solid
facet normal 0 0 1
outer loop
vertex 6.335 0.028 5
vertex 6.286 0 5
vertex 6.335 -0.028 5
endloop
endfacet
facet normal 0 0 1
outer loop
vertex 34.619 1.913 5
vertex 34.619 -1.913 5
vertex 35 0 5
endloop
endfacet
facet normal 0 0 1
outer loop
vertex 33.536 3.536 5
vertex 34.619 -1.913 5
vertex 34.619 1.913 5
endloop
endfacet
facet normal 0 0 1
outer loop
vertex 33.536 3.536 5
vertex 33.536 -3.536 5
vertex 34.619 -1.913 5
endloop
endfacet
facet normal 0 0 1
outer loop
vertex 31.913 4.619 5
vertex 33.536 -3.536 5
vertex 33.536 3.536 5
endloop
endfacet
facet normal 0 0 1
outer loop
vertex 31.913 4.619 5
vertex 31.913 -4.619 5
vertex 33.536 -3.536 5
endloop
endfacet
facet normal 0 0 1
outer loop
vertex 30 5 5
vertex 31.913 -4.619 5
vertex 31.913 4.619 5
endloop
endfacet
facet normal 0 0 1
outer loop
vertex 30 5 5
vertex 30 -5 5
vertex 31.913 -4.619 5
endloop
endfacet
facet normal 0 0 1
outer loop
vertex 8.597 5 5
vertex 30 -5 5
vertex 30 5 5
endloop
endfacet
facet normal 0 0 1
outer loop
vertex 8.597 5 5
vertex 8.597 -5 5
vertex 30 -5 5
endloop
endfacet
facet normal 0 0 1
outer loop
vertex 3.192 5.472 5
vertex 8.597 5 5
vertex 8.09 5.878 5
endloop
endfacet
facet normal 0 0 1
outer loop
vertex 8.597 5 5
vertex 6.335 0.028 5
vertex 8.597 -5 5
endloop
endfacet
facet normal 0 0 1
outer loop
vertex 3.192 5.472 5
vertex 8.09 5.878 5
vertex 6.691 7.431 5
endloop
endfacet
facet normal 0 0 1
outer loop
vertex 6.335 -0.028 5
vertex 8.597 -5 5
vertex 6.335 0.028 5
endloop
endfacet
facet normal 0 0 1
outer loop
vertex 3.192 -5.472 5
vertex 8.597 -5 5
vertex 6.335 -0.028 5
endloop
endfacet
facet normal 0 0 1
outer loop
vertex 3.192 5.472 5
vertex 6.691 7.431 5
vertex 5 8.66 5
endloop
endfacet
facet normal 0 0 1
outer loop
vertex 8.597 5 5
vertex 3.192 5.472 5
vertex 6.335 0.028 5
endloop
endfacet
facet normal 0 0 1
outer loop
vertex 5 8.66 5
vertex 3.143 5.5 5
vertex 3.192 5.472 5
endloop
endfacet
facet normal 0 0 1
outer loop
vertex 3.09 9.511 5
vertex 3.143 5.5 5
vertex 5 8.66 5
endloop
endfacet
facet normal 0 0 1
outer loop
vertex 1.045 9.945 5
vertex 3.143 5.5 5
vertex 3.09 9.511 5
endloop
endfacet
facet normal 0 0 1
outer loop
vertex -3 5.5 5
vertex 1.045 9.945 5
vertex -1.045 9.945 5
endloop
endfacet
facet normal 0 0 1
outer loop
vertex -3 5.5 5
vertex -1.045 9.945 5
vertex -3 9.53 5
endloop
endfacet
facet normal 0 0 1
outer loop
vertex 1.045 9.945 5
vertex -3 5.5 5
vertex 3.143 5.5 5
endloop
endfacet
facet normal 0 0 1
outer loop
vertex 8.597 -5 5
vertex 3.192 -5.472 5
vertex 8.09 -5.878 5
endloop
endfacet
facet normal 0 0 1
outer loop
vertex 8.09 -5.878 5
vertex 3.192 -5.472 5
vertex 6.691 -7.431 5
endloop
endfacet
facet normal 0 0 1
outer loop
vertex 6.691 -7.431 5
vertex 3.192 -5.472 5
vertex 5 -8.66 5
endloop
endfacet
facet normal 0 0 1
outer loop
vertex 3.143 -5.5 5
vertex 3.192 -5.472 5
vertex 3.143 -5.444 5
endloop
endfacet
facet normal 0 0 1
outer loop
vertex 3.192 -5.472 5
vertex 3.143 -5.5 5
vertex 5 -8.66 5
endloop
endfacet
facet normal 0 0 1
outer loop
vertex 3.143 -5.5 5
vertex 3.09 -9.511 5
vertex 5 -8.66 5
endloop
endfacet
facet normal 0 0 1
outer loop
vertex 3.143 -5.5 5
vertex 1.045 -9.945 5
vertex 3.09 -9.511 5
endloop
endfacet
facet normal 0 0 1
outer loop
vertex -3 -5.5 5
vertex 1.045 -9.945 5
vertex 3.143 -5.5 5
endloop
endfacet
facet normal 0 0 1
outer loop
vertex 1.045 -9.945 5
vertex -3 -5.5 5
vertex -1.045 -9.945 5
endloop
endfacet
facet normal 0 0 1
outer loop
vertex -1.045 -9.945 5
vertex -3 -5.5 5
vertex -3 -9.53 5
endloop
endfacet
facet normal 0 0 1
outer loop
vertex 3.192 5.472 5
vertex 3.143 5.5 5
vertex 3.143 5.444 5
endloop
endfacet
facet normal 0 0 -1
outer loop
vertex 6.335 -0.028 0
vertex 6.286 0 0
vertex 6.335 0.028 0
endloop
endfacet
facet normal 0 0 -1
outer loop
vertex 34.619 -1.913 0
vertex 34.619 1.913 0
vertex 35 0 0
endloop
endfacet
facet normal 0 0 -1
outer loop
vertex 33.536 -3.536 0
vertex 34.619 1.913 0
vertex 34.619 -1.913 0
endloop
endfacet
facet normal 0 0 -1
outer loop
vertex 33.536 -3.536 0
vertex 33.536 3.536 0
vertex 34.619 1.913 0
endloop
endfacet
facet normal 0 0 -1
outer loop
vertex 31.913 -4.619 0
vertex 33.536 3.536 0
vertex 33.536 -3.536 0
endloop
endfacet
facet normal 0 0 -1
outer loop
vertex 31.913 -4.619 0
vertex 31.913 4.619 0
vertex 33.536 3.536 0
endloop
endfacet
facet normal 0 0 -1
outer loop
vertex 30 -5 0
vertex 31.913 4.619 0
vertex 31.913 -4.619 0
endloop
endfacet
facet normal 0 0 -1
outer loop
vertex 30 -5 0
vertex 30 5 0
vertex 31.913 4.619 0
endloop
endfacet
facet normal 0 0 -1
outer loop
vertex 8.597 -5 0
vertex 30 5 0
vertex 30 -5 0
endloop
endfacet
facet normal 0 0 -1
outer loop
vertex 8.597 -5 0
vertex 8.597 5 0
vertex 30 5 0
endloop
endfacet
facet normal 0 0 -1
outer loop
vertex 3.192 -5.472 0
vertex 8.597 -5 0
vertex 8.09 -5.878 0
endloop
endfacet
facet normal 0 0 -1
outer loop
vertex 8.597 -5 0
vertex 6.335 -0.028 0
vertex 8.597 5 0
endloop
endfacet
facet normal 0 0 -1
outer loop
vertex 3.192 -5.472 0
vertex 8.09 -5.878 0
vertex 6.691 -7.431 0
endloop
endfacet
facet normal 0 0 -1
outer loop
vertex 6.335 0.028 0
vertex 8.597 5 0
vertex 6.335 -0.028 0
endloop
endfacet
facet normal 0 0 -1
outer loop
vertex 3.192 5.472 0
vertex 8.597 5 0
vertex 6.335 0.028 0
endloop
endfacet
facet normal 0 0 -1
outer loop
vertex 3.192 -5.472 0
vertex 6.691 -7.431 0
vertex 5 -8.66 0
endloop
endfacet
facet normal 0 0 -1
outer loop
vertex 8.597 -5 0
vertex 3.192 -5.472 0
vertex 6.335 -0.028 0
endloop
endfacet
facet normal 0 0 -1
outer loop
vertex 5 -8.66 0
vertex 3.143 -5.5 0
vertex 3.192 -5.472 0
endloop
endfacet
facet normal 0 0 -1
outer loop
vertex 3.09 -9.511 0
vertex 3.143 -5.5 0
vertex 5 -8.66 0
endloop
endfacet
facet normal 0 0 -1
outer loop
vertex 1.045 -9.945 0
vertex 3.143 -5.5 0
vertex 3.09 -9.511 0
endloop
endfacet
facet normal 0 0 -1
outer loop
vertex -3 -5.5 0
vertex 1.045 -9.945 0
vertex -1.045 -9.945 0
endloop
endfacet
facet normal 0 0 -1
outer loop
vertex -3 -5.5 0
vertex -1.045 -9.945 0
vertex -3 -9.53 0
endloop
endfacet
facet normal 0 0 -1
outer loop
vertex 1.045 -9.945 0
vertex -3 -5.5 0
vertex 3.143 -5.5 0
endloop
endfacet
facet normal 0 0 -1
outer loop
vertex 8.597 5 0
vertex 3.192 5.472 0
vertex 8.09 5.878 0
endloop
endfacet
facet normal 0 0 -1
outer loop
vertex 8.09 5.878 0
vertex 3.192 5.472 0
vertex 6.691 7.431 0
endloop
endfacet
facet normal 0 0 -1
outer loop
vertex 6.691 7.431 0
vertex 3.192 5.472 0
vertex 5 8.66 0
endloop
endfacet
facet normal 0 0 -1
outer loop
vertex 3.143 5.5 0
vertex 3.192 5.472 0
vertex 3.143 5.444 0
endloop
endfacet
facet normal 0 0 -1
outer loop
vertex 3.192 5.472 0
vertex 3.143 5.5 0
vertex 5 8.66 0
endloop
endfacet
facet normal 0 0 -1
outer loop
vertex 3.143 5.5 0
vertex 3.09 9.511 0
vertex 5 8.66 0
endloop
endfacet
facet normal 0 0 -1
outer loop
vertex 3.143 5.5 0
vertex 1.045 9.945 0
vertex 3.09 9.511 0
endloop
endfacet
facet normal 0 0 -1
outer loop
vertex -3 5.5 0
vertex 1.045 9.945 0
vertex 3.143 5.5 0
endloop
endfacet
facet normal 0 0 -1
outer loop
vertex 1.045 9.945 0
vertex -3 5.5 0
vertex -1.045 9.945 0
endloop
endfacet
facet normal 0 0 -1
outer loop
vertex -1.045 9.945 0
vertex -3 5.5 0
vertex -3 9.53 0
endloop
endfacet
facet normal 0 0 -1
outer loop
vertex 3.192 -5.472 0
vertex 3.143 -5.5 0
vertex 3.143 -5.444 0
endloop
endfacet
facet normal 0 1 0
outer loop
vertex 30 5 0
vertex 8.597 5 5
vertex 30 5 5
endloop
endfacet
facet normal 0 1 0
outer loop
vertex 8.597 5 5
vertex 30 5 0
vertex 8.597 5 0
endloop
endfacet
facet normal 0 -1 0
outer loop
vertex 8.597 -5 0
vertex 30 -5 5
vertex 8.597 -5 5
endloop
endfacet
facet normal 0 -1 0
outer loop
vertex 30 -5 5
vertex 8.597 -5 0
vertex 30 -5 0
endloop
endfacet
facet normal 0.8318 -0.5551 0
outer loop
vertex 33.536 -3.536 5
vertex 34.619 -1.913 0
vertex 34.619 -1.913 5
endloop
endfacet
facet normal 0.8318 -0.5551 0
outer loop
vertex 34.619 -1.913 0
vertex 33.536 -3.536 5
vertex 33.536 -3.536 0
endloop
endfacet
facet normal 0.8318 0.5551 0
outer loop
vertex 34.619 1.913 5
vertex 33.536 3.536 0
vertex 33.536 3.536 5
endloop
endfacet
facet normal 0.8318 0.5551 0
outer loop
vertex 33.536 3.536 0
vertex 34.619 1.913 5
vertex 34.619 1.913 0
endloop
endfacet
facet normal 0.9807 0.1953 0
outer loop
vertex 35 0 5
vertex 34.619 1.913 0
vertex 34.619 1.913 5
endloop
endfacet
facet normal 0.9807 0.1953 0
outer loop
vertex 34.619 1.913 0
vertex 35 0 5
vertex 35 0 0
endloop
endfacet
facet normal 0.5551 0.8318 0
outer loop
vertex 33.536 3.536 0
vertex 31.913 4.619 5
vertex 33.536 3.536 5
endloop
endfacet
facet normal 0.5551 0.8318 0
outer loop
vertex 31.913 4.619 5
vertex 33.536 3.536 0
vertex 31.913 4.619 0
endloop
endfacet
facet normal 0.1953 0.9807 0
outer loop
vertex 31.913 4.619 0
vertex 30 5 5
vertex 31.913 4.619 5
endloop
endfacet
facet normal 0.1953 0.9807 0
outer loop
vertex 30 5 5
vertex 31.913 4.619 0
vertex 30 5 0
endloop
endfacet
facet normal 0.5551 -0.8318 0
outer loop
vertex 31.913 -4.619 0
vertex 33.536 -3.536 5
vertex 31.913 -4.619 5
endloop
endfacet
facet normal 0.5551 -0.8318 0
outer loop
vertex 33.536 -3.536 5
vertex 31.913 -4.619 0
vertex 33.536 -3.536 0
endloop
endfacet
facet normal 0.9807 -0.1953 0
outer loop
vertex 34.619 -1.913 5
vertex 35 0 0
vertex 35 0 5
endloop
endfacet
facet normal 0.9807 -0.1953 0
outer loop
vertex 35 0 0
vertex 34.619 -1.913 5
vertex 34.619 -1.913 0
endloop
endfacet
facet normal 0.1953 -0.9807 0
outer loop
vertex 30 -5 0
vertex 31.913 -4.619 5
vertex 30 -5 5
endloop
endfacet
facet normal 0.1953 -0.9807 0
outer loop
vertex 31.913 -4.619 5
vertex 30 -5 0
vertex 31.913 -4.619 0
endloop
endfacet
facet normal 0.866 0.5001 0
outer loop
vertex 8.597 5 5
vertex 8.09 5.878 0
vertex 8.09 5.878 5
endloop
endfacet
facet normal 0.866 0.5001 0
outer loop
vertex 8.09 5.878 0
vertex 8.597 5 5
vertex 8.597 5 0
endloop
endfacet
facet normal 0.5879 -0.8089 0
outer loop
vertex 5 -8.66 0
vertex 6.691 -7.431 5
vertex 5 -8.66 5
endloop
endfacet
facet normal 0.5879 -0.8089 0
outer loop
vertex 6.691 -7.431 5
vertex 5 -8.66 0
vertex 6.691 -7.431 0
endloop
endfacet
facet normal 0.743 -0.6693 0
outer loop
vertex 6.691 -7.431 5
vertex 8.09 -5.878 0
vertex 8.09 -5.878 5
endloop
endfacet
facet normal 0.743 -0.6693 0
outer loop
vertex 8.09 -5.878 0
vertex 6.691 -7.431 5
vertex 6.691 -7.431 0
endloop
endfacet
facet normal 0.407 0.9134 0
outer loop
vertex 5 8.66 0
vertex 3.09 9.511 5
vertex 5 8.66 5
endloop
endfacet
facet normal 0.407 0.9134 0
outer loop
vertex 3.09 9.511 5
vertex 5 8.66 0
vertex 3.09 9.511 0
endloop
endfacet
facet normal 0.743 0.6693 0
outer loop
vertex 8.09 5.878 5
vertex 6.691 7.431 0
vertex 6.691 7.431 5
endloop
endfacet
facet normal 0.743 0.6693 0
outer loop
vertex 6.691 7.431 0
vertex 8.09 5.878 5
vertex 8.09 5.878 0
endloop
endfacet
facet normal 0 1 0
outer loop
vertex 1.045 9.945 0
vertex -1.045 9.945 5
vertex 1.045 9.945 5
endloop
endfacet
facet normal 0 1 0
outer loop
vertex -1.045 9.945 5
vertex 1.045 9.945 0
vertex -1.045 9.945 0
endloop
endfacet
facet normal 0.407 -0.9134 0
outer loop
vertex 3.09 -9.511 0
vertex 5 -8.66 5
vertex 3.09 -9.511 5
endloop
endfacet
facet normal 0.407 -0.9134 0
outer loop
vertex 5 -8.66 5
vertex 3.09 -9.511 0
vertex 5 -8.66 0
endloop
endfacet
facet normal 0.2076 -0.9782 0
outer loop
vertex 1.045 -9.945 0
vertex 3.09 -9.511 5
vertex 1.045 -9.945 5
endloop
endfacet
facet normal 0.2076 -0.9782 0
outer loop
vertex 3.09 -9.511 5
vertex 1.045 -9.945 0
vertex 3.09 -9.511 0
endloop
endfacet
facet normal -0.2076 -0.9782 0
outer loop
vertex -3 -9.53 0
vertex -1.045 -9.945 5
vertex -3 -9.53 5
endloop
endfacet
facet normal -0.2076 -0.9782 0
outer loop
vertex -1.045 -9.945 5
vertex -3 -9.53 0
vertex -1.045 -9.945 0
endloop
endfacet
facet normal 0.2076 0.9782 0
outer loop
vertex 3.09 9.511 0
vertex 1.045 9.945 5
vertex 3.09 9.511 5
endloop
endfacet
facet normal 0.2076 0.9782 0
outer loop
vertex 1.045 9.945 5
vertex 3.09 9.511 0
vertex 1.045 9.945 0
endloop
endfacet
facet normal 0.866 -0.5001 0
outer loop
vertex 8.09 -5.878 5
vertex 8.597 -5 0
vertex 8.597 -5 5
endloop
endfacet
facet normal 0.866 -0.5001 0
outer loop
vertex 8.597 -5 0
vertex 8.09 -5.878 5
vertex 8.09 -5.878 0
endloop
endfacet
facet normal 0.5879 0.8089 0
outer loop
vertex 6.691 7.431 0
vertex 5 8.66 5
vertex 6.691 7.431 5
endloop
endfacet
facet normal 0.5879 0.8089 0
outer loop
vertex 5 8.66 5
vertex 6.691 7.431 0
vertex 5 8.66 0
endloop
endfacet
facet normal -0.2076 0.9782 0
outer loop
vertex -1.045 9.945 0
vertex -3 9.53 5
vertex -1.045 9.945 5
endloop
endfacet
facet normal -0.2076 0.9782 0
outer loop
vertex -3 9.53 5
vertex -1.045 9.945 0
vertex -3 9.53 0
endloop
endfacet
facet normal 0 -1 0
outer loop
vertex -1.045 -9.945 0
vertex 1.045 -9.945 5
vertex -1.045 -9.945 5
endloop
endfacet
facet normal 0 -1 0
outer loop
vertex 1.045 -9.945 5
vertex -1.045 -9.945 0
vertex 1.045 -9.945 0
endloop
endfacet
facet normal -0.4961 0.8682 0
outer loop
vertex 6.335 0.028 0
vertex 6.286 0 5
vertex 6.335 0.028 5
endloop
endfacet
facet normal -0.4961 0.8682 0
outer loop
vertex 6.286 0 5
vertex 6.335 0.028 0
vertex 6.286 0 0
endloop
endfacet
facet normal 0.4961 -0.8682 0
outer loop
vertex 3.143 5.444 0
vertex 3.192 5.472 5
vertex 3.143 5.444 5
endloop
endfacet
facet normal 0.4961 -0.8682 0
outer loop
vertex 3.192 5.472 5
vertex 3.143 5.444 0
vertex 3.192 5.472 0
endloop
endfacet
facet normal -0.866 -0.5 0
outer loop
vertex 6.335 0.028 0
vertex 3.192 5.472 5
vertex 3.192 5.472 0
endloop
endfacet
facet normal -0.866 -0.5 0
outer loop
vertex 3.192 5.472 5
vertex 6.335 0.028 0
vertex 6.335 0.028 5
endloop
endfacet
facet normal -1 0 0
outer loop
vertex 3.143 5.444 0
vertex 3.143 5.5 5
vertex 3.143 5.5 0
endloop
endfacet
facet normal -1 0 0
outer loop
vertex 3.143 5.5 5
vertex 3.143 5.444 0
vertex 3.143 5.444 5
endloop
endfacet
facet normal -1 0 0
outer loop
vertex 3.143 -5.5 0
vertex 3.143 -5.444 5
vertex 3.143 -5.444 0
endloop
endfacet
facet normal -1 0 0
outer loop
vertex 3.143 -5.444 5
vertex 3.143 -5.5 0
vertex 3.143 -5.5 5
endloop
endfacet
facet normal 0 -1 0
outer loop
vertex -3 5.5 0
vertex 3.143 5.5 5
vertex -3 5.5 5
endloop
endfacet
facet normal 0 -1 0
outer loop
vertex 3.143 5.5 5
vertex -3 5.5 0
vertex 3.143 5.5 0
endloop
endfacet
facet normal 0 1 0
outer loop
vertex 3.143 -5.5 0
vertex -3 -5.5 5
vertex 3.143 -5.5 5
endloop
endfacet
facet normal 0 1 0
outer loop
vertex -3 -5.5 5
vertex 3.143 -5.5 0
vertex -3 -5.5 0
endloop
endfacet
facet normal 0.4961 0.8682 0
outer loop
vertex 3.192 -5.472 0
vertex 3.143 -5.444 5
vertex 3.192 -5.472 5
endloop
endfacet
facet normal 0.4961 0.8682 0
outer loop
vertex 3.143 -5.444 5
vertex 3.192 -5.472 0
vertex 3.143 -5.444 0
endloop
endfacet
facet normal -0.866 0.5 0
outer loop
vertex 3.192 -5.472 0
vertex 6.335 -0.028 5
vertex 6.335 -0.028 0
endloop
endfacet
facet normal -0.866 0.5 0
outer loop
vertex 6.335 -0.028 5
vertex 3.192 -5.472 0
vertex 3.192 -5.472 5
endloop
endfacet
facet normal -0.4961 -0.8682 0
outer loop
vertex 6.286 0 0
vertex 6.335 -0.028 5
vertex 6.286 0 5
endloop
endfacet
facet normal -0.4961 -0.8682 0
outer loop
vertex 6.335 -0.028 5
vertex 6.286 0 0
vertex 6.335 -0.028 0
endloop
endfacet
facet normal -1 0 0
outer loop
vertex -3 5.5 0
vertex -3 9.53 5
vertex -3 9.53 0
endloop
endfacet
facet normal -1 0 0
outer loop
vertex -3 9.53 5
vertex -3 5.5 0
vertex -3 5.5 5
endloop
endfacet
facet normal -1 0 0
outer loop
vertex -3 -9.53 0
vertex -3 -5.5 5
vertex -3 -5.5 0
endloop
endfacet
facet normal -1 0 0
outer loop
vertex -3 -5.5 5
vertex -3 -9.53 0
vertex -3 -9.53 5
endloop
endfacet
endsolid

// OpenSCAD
include <MCAD/shapes.scad>

module miniwrench() {
    SX = 30;
    SY = 10;
    SZ = 5;

    nut_d = 10.90 + 0.1; // 1/4" nut

    difference() {
        union() {
            translate([0, -SY/2, 0]) cube([SX, SY, SZ]);
            translate([SX, 0, 0]) cylinder(d=SY, h=SZ);
            cylinder(d=SY*2, h=SZ);
        }
        translate([0, 0, 0]) hexagon(nut_d, SZ*3);
        translate([-8, 0, 0]) cube([SY, 100, 100], center=true);
    }

}

miniwrench();
